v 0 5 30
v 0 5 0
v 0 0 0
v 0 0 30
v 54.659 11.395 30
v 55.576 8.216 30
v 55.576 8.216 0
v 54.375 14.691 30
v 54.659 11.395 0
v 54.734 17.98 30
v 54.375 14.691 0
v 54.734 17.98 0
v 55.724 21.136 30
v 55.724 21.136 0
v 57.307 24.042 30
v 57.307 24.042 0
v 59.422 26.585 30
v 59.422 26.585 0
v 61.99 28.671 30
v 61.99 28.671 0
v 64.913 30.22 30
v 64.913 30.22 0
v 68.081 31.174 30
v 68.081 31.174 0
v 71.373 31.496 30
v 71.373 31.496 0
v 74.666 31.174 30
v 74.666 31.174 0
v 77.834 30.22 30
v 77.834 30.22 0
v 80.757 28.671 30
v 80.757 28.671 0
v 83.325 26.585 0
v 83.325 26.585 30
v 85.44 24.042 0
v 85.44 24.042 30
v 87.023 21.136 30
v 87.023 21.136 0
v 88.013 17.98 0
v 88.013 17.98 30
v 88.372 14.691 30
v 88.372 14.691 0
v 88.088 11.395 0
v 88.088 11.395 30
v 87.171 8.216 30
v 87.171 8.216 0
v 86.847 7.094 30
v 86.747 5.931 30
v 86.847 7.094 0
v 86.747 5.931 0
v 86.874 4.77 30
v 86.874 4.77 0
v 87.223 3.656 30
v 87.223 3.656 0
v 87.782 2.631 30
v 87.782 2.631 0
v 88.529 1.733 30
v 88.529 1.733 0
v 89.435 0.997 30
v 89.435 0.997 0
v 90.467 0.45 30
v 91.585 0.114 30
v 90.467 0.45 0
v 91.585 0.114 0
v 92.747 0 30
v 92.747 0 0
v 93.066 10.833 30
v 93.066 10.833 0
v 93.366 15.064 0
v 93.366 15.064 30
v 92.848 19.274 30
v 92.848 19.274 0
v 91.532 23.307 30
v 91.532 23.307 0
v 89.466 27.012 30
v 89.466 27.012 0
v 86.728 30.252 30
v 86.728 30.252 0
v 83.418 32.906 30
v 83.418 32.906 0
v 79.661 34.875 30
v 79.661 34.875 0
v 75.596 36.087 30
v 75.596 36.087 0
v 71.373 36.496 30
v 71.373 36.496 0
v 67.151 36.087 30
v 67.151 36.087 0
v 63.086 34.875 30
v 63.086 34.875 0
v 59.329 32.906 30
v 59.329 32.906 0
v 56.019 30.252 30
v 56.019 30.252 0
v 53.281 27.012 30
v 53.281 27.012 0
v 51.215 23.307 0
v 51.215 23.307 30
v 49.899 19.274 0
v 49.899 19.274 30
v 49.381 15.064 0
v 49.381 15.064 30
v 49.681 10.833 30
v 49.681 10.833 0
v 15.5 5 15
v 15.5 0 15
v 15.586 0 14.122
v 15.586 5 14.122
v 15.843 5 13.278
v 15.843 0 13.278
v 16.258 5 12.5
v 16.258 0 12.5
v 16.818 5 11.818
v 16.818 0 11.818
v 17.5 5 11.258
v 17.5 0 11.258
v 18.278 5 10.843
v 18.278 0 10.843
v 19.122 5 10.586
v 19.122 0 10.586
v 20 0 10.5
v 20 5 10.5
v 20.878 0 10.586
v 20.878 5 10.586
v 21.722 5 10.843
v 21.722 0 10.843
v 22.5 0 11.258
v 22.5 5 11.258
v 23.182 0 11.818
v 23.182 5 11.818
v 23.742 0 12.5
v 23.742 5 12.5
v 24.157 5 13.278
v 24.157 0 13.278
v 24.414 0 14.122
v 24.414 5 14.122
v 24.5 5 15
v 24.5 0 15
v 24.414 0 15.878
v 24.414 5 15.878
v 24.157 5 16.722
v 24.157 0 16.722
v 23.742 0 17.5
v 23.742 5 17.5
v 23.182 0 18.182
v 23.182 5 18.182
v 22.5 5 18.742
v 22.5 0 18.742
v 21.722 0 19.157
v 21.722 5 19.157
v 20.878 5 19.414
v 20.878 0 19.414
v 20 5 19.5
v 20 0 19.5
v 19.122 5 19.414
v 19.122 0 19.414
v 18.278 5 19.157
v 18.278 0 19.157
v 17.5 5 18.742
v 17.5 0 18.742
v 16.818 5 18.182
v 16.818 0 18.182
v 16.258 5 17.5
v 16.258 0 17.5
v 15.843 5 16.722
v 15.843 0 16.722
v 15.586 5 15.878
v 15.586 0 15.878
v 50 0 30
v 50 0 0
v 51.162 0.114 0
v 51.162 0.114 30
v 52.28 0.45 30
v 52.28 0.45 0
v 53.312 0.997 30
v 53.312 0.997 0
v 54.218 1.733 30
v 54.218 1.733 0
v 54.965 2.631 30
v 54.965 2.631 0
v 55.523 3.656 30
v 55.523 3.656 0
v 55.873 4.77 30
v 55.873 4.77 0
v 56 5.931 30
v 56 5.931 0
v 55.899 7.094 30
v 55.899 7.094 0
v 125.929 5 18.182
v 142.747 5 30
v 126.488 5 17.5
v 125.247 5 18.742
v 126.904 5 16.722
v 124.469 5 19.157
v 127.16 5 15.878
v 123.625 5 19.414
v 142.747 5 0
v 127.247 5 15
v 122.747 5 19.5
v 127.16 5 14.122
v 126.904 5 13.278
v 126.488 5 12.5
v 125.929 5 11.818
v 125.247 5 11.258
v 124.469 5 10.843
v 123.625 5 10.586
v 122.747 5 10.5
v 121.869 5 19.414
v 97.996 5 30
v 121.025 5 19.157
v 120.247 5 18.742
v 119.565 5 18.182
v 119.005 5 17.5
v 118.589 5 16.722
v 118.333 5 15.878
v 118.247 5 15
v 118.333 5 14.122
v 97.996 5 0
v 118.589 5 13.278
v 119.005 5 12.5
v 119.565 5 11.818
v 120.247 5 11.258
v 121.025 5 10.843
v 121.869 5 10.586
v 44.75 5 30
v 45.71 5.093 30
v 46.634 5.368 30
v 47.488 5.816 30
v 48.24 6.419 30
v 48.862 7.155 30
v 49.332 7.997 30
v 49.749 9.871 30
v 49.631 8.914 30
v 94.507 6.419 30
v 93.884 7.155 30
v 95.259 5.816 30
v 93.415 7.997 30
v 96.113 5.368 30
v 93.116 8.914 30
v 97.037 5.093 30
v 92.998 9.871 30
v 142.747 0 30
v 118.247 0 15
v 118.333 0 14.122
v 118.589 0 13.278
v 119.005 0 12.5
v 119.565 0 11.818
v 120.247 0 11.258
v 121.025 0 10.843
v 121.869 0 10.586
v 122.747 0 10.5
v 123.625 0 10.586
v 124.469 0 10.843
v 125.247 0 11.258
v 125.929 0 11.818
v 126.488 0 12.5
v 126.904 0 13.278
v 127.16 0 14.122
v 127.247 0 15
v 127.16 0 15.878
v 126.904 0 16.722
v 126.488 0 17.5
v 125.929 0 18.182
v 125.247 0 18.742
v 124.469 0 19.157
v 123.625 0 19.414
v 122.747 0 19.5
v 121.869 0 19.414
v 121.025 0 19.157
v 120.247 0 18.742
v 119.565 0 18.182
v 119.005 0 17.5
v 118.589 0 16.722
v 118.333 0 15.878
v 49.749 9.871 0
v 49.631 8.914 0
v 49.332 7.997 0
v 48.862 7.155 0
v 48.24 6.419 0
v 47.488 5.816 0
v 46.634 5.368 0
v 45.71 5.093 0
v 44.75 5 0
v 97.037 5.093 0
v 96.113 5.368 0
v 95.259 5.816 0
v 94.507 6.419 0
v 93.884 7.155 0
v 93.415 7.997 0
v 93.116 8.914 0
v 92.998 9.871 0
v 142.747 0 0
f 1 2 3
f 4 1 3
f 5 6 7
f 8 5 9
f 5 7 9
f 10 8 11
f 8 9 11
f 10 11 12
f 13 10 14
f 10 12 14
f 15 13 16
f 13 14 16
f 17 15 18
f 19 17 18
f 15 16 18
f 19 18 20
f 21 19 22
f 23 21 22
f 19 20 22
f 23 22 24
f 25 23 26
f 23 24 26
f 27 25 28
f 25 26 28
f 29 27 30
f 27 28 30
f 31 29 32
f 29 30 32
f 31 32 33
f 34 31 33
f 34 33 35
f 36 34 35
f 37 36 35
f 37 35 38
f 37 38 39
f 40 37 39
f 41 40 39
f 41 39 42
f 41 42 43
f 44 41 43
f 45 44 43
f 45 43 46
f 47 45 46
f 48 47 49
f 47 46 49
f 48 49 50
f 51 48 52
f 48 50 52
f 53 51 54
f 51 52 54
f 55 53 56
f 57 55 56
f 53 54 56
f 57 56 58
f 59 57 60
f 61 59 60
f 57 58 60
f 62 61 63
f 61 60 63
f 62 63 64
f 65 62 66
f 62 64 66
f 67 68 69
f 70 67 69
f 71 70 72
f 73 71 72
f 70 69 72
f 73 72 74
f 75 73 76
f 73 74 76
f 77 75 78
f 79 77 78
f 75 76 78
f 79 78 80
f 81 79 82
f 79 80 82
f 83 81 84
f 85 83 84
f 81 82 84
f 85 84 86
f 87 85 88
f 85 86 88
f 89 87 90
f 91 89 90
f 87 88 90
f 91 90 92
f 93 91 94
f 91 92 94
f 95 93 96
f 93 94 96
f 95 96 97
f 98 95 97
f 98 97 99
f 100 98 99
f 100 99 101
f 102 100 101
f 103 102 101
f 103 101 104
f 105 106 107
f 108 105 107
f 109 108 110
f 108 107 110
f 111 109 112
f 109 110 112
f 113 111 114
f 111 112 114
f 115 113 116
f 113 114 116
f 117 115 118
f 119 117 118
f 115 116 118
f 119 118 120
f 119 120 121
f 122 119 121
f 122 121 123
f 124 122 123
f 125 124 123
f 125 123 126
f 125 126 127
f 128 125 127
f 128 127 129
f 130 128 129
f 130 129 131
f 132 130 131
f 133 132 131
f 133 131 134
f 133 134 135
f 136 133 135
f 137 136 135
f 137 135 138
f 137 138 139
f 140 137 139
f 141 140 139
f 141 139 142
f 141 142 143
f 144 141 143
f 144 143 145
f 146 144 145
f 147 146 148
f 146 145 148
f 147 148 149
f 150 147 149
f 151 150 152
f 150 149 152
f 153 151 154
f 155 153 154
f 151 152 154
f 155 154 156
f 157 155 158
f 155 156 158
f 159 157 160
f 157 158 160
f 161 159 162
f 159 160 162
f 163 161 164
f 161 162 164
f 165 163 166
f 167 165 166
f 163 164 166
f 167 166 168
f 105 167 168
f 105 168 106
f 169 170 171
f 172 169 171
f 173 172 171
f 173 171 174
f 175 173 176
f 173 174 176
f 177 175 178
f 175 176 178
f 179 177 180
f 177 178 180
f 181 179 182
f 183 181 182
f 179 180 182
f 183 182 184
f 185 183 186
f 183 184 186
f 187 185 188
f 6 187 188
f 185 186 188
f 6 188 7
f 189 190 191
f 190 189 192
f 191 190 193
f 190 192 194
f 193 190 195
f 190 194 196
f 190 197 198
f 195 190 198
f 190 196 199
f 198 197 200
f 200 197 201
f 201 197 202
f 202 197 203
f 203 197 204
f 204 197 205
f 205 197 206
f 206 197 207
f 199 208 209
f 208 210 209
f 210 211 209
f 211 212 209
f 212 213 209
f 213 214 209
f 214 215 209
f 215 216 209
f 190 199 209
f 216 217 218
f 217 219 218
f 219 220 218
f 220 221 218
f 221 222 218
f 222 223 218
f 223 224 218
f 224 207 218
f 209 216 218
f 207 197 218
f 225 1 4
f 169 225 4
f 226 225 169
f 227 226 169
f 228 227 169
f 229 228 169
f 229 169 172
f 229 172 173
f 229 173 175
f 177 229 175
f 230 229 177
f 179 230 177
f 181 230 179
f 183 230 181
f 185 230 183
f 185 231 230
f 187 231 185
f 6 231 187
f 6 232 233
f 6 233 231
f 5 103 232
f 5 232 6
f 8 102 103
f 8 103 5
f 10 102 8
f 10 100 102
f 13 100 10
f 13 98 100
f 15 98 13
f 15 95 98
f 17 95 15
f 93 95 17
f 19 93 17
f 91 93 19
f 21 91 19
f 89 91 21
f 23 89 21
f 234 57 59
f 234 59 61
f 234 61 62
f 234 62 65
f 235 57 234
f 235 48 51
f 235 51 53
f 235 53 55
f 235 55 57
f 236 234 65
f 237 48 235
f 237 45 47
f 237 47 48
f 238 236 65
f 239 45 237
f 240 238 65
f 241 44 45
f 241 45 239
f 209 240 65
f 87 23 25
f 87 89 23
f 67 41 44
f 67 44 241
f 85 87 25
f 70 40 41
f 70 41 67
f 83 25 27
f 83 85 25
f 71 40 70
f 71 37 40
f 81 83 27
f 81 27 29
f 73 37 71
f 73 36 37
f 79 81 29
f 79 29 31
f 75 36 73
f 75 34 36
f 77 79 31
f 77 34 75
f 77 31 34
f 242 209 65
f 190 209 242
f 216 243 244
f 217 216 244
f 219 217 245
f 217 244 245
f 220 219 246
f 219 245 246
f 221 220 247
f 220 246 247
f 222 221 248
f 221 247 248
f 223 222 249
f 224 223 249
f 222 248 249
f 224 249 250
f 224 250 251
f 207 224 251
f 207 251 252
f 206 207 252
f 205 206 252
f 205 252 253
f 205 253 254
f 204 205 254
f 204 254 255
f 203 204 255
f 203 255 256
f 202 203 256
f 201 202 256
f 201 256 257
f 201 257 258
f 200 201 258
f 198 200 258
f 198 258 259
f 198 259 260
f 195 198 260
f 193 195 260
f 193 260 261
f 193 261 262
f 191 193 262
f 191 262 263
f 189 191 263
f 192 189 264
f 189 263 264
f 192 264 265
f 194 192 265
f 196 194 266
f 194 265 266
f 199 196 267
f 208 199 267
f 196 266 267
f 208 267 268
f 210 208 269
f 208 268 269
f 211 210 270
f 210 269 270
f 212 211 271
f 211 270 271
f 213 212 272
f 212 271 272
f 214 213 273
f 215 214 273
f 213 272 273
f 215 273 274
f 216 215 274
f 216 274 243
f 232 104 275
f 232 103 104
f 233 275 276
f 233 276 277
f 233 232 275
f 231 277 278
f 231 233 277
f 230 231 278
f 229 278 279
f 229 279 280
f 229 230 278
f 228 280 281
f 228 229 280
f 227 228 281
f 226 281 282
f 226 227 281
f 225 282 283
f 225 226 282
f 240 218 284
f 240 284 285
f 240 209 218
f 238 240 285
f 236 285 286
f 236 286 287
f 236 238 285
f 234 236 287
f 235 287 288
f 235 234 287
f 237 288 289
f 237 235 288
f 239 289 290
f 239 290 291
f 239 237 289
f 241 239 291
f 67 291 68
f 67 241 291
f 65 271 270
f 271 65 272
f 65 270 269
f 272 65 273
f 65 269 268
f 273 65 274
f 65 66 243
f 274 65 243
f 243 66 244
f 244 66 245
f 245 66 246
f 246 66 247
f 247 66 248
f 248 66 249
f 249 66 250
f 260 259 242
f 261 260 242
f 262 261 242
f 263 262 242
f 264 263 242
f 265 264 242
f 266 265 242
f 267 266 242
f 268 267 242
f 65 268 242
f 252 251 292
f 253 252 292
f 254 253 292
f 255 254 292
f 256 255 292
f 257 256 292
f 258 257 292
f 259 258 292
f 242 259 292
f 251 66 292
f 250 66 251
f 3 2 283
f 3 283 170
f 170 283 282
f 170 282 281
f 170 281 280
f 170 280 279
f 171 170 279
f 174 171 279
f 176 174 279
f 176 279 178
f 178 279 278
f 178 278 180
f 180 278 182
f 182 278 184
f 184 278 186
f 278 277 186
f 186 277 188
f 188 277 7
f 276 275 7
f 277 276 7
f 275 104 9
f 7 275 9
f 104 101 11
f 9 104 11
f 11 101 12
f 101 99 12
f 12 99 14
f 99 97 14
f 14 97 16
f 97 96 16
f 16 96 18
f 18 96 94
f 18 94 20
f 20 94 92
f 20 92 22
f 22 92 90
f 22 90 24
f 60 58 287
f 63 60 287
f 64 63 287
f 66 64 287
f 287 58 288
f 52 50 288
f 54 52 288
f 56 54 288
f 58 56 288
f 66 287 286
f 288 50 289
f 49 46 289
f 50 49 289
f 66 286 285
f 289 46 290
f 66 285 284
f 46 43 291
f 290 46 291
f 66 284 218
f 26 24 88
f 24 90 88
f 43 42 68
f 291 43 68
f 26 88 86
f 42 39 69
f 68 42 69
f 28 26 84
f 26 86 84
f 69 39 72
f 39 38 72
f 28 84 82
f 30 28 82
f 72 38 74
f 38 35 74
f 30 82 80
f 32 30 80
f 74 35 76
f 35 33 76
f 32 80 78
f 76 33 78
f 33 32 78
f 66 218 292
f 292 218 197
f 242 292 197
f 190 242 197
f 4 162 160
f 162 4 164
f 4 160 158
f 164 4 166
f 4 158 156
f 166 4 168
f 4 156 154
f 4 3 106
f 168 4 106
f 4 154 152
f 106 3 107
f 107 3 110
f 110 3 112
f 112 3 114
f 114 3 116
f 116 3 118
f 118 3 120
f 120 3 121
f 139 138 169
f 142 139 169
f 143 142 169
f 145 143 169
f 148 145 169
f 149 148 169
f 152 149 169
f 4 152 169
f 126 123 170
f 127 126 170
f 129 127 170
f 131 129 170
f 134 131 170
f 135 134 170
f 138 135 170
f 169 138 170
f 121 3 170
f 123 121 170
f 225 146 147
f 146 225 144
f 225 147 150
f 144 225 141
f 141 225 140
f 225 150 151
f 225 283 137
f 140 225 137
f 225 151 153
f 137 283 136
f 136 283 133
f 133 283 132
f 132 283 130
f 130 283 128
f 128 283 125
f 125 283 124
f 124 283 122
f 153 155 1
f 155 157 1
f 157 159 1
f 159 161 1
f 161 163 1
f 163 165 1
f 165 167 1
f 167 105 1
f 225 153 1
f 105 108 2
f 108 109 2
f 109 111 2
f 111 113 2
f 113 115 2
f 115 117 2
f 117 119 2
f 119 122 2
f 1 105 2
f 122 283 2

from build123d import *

# Parameters (mm, degrees)
BOSS_EXTRUDE1_DEPTH  = 30
FILLET3_R            = 5
M8_CLEARANCE_HOLE2_D = 9


with BuildPart() as part:
    # Sketch1 → Boss-Extrude1 (new body)
    with BuildSketch(Plane.XY):
        with BuildLine():
            Line((0, 5), (0, 0))
            Line((0, 0), (50, 0))
            ThreePointArc((50, 0), (54.964763693, 2.630857457), (55.575665525, 8.216292841))
            ThreePointArc((55.575665525, 8.216292841), (71.373384511, 31.495789225), (87.171103497, 8.216292841))
            ThreePointArc((87.171103497, 8.216292841), (87.782005329, 2.630857457), (92.746769021, 0))
            Line((92.746769021, 0), (142.746769021, 0))
            Line((142.746769021, 0), (142.746769021, 5))
            Line((142.746769021, 5), (91.218534724, 5))
            ThreePointArc((91.218534724, 5), (71.373384511, 36.495789225), (51.528234297, 5))
            Line((51.528234297, 5), (5, 5))
            Line((5, 5), (0, 5))
        make_face()
    extrude(amount=BOSS_EXTRUDE1_DEPTH)

    # Fillet3
    fillet3_edges = [part.edges().sort_by_distance(p)[0] for p in [
        (51.528234297, 5, 15),
        (91.218534724, 5, 15),
    ]]
    fillet(fillet3_edges, radius=FILLET3_R)

    # M8 Clearance Hole2 (through all)
    with Locations(Plane(origin=(0, 5, 0), x_dir=(1, 0, 0), z_dir=(0, 1, 0))):
        with Locations((20, -15), (122.746769021, -15)):
            Hole(M8_CLEARANCE_HOLE2_D / 2)


solid = part.part
